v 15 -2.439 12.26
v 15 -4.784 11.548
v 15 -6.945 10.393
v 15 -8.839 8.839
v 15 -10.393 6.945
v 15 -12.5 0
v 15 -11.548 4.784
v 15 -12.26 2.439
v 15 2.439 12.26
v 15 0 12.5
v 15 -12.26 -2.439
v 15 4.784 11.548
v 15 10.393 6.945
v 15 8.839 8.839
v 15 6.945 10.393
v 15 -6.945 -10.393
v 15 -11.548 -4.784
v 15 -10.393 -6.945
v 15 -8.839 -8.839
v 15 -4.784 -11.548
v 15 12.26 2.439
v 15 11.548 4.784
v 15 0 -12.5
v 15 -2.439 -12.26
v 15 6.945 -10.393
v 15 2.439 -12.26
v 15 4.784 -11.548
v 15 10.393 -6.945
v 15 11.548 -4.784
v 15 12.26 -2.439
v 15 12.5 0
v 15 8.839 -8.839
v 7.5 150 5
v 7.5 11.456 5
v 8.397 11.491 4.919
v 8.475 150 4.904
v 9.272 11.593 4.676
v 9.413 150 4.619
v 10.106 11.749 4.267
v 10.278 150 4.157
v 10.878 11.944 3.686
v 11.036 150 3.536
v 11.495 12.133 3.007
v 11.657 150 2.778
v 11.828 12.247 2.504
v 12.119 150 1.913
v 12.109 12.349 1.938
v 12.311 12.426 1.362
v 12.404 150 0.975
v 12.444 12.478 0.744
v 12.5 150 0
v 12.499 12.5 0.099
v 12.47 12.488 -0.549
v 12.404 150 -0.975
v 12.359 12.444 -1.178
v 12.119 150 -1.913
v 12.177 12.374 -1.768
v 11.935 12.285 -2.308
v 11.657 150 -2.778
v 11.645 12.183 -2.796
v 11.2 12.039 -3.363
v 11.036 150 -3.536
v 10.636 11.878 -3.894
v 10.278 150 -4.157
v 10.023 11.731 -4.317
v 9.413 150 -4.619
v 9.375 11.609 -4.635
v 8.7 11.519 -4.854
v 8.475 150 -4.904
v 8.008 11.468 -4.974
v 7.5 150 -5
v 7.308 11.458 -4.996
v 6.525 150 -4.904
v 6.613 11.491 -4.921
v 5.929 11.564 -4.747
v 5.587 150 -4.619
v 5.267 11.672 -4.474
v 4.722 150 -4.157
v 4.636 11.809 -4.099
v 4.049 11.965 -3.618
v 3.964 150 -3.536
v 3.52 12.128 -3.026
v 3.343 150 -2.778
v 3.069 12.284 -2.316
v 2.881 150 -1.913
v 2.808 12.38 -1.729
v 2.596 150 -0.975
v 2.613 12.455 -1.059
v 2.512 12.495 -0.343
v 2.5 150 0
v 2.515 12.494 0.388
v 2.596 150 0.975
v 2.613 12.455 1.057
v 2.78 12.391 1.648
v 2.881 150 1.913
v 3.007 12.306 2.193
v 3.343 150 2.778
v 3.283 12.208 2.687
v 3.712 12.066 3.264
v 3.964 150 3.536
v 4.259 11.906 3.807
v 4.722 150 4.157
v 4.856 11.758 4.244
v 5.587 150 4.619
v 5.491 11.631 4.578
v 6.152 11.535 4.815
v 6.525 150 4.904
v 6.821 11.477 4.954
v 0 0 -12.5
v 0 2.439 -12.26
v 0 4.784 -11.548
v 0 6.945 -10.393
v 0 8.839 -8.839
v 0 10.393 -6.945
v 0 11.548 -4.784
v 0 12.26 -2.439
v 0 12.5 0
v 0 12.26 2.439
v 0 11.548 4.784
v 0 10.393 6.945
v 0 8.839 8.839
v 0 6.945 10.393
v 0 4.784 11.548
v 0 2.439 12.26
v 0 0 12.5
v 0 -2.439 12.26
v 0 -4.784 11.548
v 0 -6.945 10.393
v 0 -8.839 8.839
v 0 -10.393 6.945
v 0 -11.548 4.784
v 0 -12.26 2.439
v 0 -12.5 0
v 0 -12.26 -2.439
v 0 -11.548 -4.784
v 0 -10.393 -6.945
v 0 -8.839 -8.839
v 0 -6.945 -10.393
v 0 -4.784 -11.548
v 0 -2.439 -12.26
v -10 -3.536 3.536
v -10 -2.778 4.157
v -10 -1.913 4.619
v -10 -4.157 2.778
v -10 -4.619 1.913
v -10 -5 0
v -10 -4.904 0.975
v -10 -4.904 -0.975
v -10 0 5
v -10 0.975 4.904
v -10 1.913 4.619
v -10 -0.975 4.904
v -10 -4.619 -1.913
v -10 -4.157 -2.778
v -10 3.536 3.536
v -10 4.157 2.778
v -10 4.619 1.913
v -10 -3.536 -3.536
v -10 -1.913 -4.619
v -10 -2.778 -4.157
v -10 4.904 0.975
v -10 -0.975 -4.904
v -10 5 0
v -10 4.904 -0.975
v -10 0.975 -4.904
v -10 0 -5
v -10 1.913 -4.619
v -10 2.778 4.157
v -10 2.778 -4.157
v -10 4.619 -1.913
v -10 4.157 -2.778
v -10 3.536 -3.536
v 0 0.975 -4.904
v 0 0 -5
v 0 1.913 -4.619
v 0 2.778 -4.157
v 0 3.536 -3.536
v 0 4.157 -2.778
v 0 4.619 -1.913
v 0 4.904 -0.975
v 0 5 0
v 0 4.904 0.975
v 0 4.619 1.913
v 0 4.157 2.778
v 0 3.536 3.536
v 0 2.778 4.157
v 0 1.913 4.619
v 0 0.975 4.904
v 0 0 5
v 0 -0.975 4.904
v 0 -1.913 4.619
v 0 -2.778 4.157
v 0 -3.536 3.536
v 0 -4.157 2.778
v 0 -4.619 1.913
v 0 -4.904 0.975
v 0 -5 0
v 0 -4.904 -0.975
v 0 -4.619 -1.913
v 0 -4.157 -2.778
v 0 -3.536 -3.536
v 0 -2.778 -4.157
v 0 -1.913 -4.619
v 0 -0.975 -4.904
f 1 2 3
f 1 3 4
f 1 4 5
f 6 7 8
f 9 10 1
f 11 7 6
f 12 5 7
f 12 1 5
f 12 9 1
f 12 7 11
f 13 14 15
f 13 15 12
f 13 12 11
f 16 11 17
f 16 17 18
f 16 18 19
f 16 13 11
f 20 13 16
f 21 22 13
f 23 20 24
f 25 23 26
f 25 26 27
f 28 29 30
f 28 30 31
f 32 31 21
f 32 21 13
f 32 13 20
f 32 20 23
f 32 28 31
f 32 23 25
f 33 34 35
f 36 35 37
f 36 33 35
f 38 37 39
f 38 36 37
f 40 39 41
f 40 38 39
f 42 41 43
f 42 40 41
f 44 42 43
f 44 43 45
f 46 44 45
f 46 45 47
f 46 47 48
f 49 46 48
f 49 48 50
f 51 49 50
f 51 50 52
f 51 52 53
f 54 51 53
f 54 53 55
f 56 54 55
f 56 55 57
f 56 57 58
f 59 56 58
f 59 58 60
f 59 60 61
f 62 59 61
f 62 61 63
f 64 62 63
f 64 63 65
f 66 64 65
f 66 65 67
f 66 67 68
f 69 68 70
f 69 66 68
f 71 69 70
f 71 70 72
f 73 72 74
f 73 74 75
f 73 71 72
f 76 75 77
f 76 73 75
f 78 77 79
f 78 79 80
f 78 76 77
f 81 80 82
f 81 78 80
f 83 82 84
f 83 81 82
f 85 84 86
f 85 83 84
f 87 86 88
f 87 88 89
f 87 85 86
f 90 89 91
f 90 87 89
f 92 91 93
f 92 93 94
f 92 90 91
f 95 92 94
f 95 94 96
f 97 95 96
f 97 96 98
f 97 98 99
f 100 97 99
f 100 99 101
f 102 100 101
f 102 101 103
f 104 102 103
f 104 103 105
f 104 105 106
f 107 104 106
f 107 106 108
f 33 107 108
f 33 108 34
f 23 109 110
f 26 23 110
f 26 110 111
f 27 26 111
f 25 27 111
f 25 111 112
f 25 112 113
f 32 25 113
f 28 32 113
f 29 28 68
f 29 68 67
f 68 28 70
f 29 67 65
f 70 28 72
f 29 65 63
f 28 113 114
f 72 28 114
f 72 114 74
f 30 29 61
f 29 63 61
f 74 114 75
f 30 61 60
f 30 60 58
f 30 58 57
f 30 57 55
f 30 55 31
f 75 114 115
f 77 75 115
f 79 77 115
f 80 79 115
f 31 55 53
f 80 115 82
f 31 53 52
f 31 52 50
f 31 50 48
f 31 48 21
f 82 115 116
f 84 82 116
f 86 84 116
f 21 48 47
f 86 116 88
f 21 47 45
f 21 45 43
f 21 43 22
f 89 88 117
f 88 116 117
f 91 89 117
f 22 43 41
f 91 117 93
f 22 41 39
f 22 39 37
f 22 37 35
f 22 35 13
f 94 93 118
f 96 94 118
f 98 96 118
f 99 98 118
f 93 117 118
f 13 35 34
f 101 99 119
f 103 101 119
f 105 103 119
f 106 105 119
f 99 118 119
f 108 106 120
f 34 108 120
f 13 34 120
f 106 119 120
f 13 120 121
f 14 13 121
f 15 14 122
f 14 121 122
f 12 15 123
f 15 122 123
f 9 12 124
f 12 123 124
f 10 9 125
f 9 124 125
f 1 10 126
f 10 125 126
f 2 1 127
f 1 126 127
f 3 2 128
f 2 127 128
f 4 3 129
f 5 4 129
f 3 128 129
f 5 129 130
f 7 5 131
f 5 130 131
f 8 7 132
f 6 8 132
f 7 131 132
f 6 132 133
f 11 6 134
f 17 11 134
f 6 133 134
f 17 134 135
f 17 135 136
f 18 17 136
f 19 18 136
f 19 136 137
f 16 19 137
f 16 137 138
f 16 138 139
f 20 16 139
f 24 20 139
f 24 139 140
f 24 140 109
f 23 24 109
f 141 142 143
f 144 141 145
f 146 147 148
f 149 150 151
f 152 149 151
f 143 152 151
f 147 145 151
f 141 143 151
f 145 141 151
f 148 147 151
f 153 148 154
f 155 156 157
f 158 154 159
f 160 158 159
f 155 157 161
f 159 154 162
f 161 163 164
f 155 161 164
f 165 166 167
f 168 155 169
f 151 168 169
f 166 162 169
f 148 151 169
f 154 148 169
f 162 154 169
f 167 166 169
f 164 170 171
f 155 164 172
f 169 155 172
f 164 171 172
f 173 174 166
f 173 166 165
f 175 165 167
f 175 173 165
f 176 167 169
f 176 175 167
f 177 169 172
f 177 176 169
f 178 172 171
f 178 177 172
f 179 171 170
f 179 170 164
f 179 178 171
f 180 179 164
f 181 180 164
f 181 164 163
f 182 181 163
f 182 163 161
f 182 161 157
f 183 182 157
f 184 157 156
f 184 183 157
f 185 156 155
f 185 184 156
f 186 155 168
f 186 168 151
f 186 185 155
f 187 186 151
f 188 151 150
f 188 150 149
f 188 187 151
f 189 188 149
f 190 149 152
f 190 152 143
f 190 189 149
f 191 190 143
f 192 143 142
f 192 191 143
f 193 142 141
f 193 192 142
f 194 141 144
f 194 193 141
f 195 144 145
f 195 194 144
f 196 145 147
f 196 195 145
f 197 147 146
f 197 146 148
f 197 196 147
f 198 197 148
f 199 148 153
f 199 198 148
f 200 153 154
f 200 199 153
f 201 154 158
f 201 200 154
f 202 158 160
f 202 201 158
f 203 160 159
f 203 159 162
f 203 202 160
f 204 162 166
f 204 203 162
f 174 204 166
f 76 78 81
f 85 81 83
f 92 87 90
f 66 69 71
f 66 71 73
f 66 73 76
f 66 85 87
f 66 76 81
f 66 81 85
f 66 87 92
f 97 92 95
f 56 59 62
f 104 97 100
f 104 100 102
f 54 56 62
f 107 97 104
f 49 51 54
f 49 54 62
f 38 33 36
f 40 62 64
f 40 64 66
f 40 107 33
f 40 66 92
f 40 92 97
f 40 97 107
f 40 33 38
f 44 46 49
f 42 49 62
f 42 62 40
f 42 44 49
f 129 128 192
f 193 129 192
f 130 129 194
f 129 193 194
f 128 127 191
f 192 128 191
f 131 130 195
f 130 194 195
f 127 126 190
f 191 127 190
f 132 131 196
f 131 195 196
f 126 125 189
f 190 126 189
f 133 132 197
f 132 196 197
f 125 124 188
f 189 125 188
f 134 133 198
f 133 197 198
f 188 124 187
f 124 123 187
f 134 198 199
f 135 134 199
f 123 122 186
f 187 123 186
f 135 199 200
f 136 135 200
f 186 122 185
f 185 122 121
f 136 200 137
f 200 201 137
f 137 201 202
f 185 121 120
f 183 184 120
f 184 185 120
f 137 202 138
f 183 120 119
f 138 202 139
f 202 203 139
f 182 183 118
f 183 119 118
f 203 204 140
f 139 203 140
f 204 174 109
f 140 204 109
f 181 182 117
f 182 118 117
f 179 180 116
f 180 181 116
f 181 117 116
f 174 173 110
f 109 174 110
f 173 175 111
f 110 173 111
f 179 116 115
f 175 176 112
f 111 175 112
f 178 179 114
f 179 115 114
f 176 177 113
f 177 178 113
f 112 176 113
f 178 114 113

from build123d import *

# Parameters (mm, degrees)
SKETCH_1_R           = 12.5
EXTRUDE_1_DEPTH      = 15
SKETCH_1_3_R         = 5
EXTRUDE_2_DEPTH      = 10
EXTRUDE_3_REACH      = 165.669
EXTRUDE_3_END_RADIUS = 12.5
SKETCH_2_R           = 5


with BuildPart() as part:
    # 草图1 → 凸台-拉伸1 (new body)
    with BuildSketch(Plane(origin=(0, 0, 0), x_dir=(0, 0, -1), z_dir=(1, 0, 0))):
        Circle(SKETCH_1_R)
    extrude(amount=EXTRUDE_1_DEPTH)

    # 草图1<3> → 凸台-拉伸2 (add)
    with BuildSketch(Plane(origin=(0, 0, 0), x_dir=(0, 0, -1), z_dir=(1, 0, 0))):
        Circle(SKETCH_1_3_R)
    extrude(amount=-EXTRUDE_2_DEPTH)

    # 凸台-拉伸3: up to this cylinder (the profile starts outside it)
    extrude_3_end = Plane(origin=(7.5, 0, 0), z_dir=(-1, 0, 0)) * Cylinder(EXTRUDE_3_END_RADIUS, 357.338, mode=Mode.PRIVATE)
    # 草图2 → 凸台-拉伸3 (add, up to the surface)
    with BuildSketch(Plane(origin=(0, 150, 0), x_dir=(1, 0, 0), z_dir=(0, 1, 0)), mode=Mode.PRIVATE) as extrude_3_sk1:
        with Locations((7.5, 0)):
            Circle(SKETCH_2_R)
    extrude_3_tool1 = extrude(extrude_3_sk1.sketch, amount=-EXTRUDE_3_REACH, mode=Mode.PRIVATE) - extrude_3_end
    add(extrude_3_tool1.solids().sort_by_distance((7.5, 150, 0))[0])


solid = part.part
